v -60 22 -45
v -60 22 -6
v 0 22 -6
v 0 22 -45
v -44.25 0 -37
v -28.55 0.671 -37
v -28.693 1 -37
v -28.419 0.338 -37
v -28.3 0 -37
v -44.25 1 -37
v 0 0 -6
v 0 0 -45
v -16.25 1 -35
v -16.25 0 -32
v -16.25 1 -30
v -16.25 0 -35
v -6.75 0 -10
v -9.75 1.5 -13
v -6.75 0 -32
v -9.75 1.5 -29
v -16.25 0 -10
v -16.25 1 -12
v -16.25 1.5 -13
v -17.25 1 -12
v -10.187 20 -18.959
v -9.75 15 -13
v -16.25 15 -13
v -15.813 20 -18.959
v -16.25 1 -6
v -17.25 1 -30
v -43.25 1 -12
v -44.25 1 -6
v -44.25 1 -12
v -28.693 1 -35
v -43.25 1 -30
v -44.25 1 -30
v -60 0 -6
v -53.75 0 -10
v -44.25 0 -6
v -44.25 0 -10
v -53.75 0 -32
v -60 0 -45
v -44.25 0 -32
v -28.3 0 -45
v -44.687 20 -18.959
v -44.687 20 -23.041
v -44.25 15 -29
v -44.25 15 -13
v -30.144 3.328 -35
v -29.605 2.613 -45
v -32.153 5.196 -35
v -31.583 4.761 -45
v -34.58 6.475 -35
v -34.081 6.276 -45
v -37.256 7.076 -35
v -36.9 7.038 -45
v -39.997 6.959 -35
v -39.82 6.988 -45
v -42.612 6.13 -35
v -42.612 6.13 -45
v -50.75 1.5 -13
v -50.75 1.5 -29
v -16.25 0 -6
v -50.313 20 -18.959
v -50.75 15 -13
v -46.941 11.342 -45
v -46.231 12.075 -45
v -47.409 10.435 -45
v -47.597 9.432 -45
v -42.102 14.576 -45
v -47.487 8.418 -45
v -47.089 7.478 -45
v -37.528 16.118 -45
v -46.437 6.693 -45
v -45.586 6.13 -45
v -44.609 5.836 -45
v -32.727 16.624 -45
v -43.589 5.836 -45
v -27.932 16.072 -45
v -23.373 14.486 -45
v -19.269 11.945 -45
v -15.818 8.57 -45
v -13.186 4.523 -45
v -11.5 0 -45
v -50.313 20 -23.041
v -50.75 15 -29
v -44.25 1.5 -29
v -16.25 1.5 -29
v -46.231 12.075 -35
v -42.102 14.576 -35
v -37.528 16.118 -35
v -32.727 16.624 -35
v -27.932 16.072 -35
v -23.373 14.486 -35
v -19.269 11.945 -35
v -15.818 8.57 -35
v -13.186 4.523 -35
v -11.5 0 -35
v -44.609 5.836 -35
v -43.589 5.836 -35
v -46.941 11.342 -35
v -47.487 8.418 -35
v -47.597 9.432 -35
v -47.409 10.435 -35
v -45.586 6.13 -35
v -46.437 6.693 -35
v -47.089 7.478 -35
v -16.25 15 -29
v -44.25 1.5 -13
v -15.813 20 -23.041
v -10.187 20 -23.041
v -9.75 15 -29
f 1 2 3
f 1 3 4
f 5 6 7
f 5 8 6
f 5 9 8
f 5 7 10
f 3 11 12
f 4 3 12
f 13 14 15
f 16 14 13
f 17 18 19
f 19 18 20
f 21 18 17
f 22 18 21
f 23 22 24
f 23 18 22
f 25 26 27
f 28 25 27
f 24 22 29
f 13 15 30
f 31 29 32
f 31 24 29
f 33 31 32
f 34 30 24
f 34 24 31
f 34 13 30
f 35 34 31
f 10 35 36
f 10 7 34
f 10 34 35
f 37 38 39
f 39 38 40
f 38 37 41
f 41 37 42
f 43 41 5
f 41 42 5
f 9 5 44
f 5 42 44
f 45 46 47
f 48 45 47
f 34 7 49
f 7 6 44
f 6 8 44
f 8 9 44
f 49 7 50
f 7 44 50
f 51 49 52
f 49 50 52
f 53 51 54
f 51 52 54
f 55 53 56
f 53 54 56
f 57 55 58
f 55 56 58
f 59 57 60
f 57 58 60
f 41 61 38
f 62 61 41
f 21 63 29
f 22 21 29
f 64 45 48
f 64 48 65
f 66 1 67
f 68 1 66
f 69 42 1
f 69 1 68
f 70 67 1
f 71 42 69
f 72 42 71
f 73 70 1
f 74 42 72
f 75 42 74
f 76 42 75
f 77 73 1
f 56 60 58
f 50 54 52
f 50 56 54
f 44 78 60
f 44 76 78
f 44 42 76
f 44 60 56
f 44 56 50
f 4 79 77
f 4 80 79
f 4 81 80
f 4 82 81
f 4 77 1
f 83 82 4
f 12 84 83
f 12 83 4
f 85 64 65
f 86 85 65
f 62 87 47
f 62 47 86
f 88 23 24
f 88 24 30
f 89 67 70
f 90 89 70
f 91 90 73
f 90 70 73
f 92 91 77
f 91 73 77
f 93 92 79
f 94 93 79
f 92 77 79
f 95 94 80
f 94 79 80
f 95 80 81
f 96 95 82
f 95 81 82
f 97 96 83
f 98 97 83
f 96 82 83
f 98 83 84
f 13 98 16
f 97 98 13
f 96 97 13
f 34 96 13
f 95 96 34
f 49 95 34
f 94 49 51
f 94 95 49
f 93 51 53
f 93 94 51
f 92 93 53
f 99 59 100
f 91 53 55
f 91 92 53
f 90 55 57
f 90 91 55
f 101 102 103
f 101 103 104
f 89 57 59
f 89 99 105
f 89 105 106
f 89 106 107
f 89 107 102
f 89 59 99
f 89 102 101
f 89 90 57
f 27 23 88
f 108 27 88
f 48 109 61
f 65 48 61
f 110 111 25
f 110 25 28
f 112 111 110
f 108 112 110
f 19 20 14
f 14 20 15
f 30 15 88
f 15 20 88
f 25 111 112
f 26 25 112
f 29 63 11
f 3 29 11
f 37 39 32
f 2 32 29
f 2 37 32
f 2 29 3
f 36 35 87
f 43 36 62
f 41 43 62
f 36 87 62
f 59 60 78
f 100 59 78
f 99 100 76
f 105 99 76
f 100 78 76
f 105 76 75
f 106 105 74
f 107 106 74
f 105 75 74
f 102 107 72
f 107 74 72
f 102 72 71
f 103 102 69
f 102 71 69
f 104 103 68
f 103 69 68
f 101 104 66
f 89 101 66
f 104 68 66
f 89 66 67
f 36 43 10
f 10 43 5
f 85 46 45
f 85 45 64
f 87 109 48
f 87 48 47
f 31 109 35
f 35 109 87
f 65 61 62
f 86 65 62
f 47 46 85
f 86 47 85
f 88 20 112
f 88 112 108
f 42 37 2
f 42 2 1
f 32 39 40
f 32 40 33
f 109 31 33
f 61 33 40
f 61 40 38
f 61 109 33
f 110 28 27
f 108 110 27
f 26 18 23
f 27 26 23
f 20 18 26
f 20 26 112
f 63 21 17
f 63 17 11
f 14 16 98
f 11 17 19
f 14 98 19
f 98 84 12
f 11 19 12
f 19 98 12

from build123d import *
from OCP.BRepFilletAPI import BRepFilletAPI_MakeChamfer

# Parameters (mm, degrees)
SKETCH1_W           = 60
SKETCH1_H           = 45
BOSS_EXTRUDE1_DEPTH = 30
SKETCH2_W           = 6.5
SKETCH2_H           = 16
CUT_EXTRUDE1_DEPTH  = 20
CHAMFER1_SIZE       = 5
CHAMFER1_SIZE2      = 0.437443318
CHAMFER2_SIZE       = 5
CHAMFER2_SIZE2      = 5.958767963
CUT_EXTRUDE2_DEPTH  = 10
CHAMFER3_SIZE       = 3
CHAMFER3_SIZE2      = 1.5
CUT_EXTRUDE3_REACH  = 82.777
SKETCH6_W           = 28
SKETCH6_H           = 31
CUT_EXTRUDE4_DEPTH  = 1


with BuildPart() as part:
    # Sketch1 → Boss-Extrude1 (new body)
    with BuildSketch(Plane(origin=(0, 0, 0), x_dir=(1, 0, 0), z_dir=(0, 1, 0))):
        with Locations((-30, 22.5)):
            Rectangle(SKETCH1_W, SKETCH1_H)
    extrude(amount=BOSS_EXTRUDE1_DEPTH)

    # Sketch2 → Cut-Extrude1 (cut)
    with BuildSketch(Plane(origin=(0, 0, 0), x_dir=(-1, 0, 0), z_dir=(0, -1, 0))):
        with Locations((47.5, 21)):
            Rectangle(SKETCH2_W, SKETCH2_H)
        with Locations((13, 21)):
            Rectangle(SKETCH2_W, SKETCH2_H)
    extrude(amount=-CUT_EXTRUDE1_DEPTH, mode=Mode.SUBTRACT)

    # Chamfer1: one chamfer whose edges measure the first distance from different faces: ONE call of the kernel's chamfer builder (chamfer() names one face for all edges)
    chamfer1_edges_1 = [part.edges().sort_by_distance(p)[0] for p in [
        (-50.75, 20, -21),
    ]]
    chamfer1_side_1 = [part.faces().sort_by_distance(p)[0] for p in [
        (-50.75, 10, -21),
    ]]
    chamfer1_edges_2 = [part.edges().sort_by_distance(p)[0] for p in [
        (-44.25, 20, -21),
    ]]
    chamfer1_side_2 = [part.faces().sort_by_distance(p)[0] for p in [
        (-44.25, 10, -21),
    ]]
    chamfer1_edges_3 = [part.edges().sort_by_distance(p)[0] for p in [
        (-16.25, 20, -21),
    ]]
    chamfer1_side_3 = [part.faces().sort_by_distance(p)[0] for p in [
        (-16.25, 10, -21),
    ]]
    chamfer1_edges_4 = [part.edges().sort_by_distance(p)[0] for p in [
        (-9.75, 20, -21),
    ]]
    chamfer1_side_4 = [part.faces().sort_by_distance(p)[0] for p in [
        (-9.75, 10, -21),
    ]]
    chamfer1 = BRepFilletAPI_MakeChamfer(part.part.solid().wrapped)
    for e in chamfer1_edges_1:
        chamfer1.Add(CHAMFER1_SIZE, CHAMFER1_SIZE2, e.wrapped, chamfer1_side_1[0].wrapped)  # the first distance lies on this face
    for e in chamfer1_edges_2:
        chamfer1.Add(CHAMFER1_SIZE, CHAMFER1_SIZE2, e.wrapped, chamfer1_side_2[0].wrapped)  # the first distance lies on this face
    for e in chamfer1_edges_3:
        chamfer1.Add(CHAMFER1_SIZE, CHAMFER1_SIZE2, e.wrapped, chamfer1_side_3[0].wrapped)  # the first distance lies on this face
    for e in chamfer1_edges_4:
        chamfer1.Add(CHAMFER1_SIZE, CHAMFER1_SIZE2, e.wrapped, chamfer1_side_4[0].wrapped)  # the first distance lies on this face
    add(Compound.cast(chamfer1.Shape()), mode=Mode.REPLACE)

    # Chamfer2: one chamfer whose edges measure the first distance from different faces: ONE call of the kernel's chamfer builder (chamfer() names one face for all edges)
    chamfer2_edges_1 = [part.edges().sort_by_distance(p)[0] for p in [
        (-47.5, 20, -29),
    ]]
    chamfer2_side_1 = [part.faces().sort_by_distance(p)[0] for p in [
        (-47.5, 9.857394508, -29),
    ]]
    chamfer2_edges_2 = [part.edges().sort_by_distance(p)[0] for p in [
        (-13, 20, -29),
    ]]
    chamfer2_side_2 = [part.faces().sort_by_distance(p)[0] for p in [
        (-13, 9.857394508, -29),
    ]]
    chamfer2_edges_3 = [part.edges().sort_by_distance(p)[0] for p in [
        (-13, 20, -13),
    ]]
    chamfer2_side_3 = [part.faces().sort_by_distance(p)[0] for p in [
        (-13, 9.857394508, -13),
    ]]
    chamfer2_edges_4 = [part.edges().sort_by_distance(p)[0] for p in [
        (-47.5, 20, -13),
    ]]
    chamfer2_side_4 = [part.faces().sort_by_distance(p)[0] for p in [
        (-47.5, 9.857394508, -13),
    ]]
    chamfer2 = BRepFilletAPI_MakeChamfer(part.part.solid().wrapped)
    for e in chamfer2_edges_1:
        chamfer2.Add(CHAMFER2_SIZE, CHAMFER2_SIZE2, e.wrapped, chamfer2_side_1[0].wrapped)  # the first distance lies on this face
    for e in chamfer2_edges_2:
        chamfer2.Add(CHAMFER2_SIZE, CHAMFER2_SIZE2, e.wrapped, chamfer2_side_2[0].wrapped)  # the first distance lies on this face
    for e in chamfer2_edges_3:
        chamfer2.Add(CHAMFER2_SIZE, CHAMFER2_SIZE2, e.wrapped, chamfer2_side_3[0].wrapped)  # the first distance lies on this face
    for e in chamfer2_edges_4:
        chamfer2.Add(CHAMFER2_SIZE, CHAMFER2_SIZE2, e.wrapped, chamfer2_side_4[0].wrapped)  # the first distance lies on this face
    add(Compound.cast(chamfer2.Shape()), mode=Mode.REPLACE)

    # Sketch4 → Cut-Extrude2 (cut)
    with BuildSketch(Plane(origin=(0, 0, -45), x_dir=(-1, 0, 0), z_dir=(0, 0, -1))):
        with BuildLine():
            Line((11.5, 0), (28.3, 0))
            ThreePointArc((28.3, 0), (34.080602383, 6.276082414), (42.61191296, 6.13008847))
            ThreePointArc((42.61191296, 6.13008847), (47.088831578, 7.478397416), (46.230644896, 12.074510224))
            ThreePointArc((46.230644896, 12.074510224), (25.608734298, 15.404376803), (11.5, 0))
        make_face()
    extrude(amount=-CUT_EXTRUDE2_DEPTH, mode=Mode.SUBTRACT)

    # Chamfer3
    chamfer3_edges = [part.edges().sort_by_distance(p)[0] for p in [
        (-50.75, 0, -21),
        (-47.5, 0, -29),
        (-44.25, 0, -21),
        (-47.5, 0, -13),
        (-16.25, 0, -21),
        (-13, 0, -29),
        (-9.75, 0, -21),
        (-13, 0, -13),
    ]]
    chamfer3_side = [part.faces().sort_by_distance(p)[0] for p in [
        (-30.707745267, 0, -21.36919105),
    ]]
    chamfer(chamfer3_edges, length=CHAMFER3_SIZE, length2=CHAMFER3_SIZE2, reference=chamfer3_side[0])

    # Sketch5 → Cut-Extrude3 (cut, up to next)
    with BuildSketch(Plane.ZY.offset(60), mode=Mode.PRIVATE) as cut_extrude3_sk1:
        Polygon((-45, 30), (0, 30), (0, 0), (-6, 0), (-6, 22), (-45, 22), align=None)
    cut_extrude3_tool1 = extrude(cut_extrude3_sk1.sketch, amount=-CUT_EXTRUDE3_REACH, mode=Mode.PRIVATE) & part.part
    add(cut_extrude3_tool1.solids().sort_by_distance((-60, 29.459167, -22.5))[0], mode=Mode.SUBTRACT)

    # Sketch6 → Cut-Extrude4 (cut)
    with BuildSketch(Plane(origin=(0, 0, 0), x_dir=(-1, 0, 0), z_dir=(0, -1, 0))):
        with Locations((30.25, 21.5)):
            Rectangle(SKETCH6_W, SKETCH6_H)
    extrude(amount=-CUT_EXTRUDE4_DEPTH, mode=Mode.SUBTRACT)


solid = part.part
